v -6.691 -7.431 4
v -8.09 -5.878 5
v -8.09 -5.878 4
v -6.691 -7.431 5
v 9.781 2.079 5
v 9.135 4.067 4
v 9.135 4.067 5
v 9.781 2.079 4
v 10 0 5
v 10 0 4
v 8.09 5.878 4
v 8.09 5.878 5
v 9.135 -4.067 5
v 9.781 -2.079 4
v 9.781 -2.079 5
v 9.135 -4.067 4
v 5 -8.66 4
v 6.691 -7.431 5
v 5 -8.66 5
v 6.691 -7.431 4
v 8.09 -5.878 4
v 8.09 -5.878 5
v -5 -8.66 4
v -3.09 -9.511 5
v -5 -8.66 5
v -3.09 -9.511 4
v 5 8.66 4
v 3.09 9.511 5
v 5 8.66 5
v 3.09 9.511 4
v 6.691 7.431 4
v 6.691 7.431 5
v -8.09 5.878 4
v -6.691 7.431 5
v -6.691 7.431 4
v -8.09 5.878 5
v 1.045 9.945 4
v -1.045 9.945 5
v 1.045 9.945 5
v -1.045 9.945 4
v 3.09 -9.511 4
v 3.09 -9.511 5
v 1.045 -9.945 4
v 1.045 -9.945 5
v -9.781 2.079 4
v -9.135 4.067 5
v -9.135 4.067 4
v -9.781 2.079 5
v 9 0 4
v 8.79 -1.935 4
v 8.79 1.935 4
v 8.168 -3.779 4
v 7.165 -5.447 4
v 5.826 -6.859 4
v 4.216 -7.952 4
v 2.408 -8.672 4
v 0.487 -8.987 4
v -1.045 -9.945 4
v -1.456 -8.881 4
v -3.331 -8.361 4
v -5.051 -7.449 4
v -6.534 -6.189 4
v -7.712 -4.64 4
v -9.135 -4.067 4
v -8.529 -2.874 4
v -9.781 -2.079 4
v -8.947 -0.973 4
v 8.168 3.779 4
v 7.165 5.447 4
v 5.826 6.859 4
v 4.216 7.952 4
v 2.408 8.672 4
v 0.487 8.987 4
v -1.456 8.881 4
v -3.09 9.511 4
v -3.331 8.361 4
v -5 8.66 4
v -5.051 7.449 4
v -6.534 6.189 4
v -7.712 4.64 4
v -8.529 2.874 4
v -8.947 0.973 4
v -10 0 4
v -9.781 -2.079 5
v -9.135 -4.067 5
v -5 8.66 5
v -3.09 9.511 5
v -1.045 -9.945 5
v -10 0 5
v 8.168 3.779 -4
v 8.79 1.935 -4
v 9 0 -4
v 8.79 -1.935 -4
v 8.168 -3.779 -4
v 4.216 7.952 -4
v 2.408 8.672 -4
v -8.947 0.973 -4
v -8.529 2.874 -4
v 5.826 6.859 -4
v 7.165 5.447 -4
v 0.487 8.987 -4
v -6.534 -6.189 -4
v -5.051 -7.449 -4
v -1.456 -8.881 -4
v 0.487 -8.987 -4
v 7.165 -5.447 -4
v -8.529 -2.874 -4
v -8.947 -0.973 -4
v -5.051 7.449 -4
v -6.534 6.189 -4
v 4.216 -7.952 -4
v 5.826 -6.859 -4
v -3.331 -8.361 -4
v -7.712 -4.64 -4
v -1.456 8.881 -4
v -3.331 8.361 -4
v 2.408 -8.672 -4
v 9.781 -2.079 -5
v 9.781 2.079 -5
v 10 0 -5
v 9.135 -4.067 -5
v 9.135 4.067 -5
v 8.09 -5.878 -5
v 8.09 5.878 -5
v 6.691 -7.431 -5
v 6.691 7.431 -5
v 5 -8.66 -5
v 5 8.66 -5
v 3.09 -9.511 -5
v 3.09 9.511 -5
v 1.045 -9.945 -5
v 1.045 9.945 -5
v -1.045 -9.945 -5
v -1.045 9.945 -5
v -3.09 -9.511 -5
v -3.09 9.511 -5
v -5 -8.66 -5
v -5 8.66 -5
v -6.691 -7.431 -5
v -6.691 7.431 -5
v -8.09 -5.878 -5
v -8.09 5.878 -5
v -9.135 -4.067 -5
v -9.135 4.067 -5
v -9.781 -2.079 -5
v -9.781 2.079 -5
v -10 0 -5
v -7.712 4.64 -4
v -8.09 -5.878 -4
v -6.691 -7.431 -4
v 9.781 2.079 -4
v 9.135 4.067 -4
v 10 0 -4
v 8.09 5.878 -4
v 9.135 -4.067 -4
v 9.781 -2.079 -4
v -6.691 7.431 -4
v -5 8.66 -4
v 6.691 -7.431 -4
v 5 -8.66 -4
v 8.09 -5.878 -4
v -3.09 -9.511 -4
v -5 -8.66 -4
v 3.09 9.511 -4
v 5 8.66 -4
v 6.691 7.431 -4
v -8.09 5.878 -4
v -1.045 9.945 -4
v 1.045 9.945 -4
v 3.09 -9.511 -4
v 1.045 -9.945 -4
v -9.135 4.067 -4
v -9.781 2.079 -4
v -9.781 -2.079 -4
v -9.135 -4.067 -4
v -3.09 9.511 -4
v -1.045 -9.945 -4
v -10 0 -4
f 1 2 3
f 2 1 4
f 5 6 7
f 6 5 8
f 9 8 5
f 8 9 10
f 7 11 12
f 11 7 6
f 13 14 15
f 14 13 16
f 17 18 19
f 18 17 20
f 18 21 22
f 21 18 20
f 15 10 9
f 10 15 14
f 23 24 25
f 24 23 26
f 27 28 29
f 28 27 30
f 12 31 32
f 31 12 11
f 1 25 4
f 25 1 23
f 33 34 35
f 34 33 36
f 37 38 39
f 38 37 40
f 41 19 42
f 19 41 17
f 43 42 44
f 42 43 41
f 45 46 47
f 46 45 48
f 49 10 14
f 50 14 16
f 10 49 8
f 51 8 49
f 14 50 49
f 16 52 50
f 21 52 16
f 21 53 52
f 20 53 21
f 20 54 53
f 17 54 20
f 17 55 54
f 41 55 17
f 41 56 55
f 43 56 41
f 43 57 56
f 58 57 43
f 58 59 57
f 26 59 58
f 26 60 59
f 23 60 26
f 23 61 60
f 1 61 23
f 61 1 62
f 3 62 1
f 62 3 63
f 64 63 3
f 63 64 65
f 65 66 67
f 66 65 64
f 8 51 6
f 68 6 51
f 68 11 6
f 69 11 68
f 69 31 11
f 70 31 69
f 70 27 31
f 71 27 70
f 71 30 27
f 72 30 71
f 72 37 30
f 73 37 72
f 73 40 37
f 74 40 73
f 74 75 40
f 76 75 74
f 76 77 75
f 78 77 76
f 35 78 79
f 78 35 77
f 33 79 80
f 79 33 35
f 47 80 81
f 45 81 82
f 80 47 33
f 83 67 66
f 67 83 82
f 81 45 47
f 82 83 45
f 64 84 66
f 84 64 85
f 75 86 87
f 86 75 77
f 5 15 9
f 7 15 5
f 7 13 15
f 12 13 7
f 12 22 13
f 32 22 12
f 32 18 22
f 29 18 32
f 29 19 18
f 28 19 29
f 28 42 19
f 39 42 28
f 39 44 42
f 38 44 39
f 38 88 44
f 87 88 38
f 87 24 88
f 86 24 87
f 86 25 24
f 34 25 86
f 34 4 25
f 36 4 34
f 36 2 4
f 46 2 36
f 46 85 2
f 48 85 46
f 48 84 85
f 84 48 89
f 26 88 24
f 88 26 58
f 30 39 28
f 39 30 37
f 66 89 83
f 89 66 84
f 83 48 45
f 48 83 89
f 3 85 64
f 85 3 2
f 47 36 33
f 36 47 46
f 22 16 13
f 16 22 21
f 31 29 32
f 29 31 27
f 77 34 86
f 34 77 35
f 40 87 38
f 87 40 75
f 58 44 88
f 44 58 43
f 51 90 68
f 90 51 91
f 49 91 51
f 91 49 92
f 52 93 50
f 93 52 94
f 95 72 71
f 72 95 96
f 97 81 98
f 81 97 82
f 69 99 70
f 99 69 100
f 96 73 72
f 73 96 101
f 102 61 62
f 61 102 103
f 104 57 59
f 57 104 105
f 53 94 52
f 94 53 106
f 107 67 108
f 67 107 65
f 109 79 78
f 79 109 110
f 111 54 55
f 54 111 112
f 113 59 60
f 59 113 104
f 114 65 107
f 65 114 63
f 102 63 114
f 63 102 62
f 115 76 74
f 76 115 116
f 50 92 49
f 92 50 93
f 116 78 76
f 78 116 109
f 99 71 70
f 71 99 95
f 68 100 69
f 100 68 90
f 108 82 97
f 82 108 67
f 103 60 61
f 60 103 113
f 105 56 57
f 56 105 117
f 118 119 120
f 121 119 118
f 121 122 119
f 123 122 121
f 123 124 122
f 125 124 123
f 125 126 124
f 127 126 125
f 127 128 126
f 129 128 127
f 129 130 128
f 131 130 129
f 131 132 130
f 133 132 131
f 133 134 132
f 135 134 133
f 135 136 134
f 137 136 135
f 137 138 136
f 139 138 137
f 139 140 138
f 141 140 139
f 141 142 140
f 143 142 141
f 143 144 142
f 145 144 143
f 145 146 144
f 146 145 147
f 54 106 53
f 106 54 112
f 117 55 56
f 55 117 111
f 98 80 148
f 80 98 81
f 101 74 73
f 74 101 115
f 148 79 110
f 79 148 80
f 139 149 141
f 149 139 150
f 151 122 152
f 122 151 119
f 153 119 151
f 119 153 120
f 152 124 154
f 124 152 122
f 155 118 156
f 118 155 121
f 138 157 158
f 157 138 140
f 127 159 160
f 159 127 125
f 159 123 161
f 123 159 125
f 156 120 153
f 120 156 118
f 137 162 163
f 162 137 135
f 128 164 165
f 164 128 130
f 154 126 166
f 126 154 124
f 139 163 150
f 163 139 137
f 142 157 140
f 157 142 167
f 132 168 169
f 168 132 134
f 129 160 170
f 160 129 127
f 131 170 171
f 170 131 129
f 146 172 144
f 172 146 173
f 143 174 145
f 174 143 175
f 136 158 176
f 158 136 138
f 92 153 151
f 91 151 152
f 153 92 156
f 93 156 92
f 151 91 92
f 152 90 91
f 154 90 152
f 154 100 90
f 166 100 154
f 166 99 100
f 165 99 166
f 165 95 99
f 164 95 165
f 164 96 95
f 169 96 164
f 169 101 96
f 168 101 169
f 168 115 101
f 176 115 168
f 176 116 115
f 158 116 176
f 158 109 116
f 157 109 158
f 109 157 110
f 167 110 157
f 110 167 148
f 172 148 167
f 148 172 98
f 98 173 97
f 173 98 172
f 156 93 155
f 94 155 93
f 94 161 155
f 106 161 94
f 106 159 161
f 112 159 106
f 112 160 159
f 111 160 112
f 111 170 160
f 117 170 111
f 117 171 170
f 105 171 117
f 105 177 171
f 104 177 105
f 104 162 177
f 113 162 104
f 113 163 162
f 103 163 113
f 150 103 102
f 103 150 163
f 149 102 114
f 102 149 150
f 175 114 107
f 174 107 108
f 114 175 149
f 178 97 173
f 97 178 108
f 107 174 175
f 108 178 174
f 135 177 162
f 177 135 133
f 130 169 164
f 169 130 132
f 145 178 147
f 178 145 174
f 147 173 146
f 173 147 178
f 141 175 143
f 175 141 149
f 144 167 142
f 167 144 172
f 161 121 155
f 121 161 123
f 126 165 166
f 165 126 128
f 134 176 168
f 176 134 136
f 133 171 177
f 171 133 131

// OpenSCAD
/**
 * Copyright (C) 2018, Shmish <shmish90@gmail.com>
 *
 * This code is licensed under the MIT licence
 * found in the LICENCE file in the root directory
 * of this source tree.
 */

module wheel () {
  color ([0.25, 0.25, 0.25]) {
    union () {
      translate([0, 0, 4])
      cylinder(1, 10, 10);
      cylinder(10, 9, 9, center = true);
      translate([0, 0, -5])
      cylinder(1, 10, 10);
    }
  }
}

wheel();
